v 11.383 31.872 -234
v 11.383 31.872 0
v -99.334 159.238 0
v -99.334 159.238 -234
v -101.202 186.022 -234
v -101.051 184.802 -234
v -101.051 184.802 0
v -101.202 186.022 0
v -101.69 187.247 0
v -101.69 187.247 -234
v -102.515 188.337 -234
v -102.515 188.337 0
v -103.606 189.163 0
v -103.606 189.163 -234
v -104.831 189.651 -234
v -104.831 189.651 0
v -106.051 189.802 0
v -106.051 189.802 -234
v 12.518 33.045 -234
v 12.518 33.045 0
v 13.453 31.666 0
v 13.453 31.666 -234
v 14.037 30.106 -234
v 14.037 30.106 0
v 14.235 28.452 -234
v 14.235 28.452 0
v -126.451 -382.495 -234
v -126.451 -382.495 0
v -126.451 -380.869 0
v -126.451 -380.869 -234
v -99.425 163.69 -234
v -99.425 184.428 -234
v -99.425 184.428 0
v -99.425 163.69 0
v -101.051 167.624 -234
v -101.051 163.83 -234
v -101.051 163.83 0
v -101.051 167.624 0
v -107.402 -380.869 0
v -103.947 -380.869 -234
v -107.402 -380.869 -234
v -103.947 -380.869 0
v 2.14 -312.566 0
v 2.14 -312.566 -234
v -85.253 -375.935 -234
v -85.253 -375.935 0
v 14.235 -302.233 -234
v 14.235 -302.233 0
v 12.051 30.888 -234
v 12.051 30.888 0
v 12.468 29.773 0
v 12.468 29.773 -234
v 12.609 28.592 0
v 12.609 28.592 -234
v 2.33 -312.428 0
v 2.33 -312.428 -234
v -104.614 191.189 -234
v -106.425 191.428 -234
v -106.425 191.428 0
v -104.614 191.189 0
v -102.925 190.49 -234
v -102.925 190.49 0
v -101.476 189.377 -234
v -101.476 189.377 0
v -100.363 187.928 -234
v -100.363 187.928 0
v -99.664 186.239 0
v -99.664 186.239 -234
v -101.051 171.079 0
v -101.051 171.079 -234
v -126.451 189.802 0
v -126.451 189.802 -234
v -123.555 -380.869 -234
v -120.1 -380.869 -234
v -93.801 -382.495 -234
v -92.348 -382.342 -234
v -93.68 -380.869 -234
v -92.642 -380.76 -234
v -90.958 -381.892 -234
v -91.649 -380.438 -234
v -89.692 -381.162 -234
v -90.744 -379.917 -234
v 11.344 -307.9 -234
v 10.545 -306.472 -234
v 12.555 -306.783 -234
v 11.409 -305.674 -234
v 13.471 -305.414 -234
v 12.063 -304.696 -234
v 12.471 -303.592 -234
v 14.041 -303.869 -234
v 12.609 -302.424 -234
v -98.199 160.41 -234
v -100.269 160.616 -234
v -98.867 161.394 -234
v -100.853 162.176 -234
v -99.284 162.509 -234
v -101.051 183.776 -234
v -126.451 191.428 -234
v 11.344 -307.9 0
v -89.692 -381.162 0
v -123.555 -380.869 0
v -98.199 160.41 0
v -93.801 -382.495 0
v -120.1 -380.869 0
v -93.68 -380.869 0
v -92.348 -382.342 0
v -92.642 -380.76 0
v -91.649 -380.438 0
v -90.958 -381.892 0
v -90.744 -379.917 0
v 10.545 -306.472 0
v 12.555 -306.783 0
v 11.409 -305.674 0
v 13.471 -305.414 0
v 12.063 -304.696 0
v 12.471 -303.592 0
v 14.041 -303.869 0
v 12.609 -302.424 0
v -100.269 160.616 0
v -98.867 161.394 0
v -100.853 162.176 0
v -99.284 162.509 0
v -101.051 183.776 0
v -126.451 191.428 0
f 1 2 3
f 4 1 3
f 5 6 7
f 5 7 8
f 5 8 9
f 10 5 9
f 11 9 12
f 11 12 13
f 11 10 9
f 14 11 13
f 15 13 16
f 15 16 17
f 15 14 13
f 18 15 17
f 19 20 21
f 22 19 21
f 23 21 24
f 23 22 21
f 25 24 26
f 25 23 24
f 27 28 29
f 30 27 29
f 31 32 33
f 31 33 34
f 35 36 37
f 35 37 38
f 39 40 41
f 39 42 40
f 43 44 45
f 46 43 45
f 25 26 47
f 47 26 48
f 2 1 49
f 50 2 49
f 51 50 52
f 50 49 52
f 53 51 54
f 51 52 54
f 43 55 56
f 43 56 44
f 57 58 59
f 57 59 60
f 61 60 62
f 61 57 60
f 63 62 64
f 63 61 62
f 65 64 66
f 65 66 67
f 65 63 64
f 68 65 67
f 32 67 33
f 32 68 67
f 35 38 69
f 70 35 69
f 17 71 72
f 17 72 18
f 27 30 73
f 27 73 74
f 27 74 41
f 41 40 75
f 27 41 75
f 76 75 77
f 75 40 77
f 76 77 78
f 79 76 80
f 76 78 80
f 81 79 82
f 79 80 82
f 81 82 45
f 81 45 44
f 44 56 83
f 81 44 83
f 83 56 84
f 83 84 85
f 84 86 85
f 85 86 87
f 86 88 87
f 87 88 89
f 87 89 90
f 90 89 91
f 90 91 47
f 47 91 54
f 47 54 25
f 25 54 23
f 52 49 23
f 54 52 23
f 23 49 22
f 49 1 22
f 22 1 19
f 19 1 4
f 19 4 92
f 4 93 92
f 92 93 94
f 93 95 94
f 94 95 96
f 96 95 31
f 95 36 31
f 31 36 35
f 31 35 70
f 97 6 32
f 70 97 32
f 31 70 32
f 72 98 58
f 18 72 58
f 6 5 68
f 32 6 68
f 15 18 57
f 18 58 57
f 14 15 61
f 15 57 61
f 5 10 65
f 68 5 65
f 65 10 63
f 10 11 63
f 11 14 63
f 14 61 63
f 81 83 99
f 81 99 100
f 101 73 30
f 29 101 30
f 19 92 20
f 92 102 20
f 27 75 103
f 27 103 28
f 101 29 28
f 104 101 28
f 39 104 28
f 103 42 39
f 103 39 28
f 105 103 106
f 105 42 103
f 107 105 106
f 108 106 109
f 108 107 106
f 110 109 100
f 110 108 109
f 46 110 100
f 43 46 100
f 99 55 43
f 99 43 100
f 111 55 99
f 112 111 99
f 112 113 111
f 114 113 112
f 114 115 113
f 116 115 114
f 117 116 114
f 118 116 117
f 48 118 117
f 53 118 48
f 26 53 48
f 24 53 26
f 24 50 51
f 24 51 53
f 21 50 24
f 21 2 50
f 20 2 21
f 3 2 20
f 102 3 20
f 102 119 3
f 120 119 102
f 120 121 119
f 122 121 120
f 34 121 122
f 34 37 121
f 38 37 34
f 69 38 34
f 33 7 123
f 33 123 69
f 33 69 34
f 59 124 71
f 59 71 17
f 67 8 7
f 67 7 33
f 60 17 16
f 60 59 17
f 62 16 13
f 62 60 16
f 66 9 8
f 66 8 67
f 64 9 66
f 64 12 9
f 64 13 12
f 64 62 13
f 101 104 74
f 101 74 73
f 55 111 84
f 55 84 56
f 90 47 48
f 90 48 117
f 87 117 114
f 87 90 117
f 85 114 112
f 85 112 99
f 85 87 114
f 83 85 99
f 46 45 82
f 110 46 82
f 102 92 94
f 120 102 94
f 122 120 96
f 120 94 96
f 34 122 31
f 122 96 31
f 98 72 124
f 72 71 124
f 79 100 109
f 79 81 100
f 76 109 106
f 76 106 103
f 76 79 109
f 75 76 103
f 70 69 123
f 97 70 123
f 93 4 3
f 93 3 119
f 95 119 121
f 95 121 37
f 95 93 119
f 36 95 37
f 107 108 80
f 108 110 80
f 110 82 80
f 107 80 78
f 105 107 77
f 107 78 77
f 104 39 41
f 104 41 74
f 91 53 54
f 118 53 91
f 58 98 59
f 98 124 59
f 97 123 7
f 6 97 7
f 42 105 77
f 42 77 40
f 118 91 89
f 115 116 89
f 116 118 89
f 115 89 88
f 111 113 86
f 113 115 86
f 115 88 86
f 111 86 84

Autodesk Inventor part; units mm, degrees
ref_plane "YZ Plane" through (0, 0, 0) normal (1, 0, 0) x (0, 1, 0)
ref_plane "XZ Plane" through (0, 0, 0) normal (0, 1, 0) x (-1, 0, 0)
ref_plane "XY Plane" through (0, 0, 0) normal (0, 0, 1) x (1, 0, 0)
sketch "Sketch1" plane through (0, 0, 0) normal (0, 0, 1) x (1, 0, 0)
  line L0 (12.58, -266.7) -> (12.58, -12.7) projected
  line L1 (12.6094, 30.4615) -> (-104.0379, 164.6489) projected
  line L2 (-101.051, 167.6239) -> (-101.051, 171.0791) projected
  line L3 (-101.051, 183.7761) -> (-101.051, 187.2313) projected
  line L4 (2.2104, -312.663) -> (11.2162, -295.0088) projected
  line L5 (2.2104, -312.663) -> (-30.82, -336.6137) projected
  line L6 (-87.8643, -376.8499) -> (-98.4679, -380.082) projected
  line L7 (2.14, -312.5659) -> (-85.2529, -375.9353) projected
  line L8 (-103.9473, -380.8694) -> (-107.4025, -380.8694) projected
  line L9 (-120.0995, -380.8694) -> (-123.5547, -380.8694) projected
  line L10 (-120.0995, 190.1276) -> (-123.5547, 190.1276) construction
  line L11 (-101.051, 189.8019) -> (-116.705, 189.8019) construction
  line L12 (-126.451, -355.4694) -> (-126.451, 254.1306) construction
  line L13 (-126.451, 189.8019) -> (-101.051, 189.8019)
  line L14 (12.6094, 30.4615) -> (12.6094, -304.9744)
  line L15 (12.6094, -304.9744) -> (-92.0576, -380.8694)
  line L16 (-92.0576, -380.8694) -> (-126.451, -380.8694)
  line L17 (12.6094, 30.4615) -> (-101.051, 161.2129)
  line L18 (-101.051, 161.2129) -> (-101.051, 189.8019)
  line L19 (-126.451, 191.4275) -> (-99.4254, 191.4275)
  line L20 (-99.4254, 191.4275) -> (-99.4254, 161.8207)
  line L21 (-99.4254, 161.8207) -> (14.235, 31.0693)
  line L22 (14.235, 31.0693) -> (14.235, -305.8037)
  line L23 (14.235, -305.8037) -> (-91.5302, -382.495)
  line L24 (-91.5302, -382.495) -> (-126.451, -382.495)
  line L25 (-126.451, 189.8019) -> (-126.451, 191.4275)
  line L26 (-126.451, -382.495) -> (-126.451, -380.8694)
  point P0 (0, 0)
  dimension "d0" = 1.6256
extrude "Extrusion1" add sketch "Sketch1" against normal blind 234
fillet "Fillet1" radius 5 5 edges at (-101.051, 189.8019, -117) (-99.4254, 161.8207, -117) (12.6094, 30.4615, -117) (12.6094, -304.9744, -117) (-92.0576, -380.8694, -117)
fillet "Fillet2" radius 7 5 edges at (-91.5302, -382.495, -117) (14.235, -305.8037, -117) (14.235, 31.0693, -117) (-101.051, 161.2129, -117) (-99.4254, 191.4275, -117)
properties part number "skidPlateV1" material "Stainless Steel"
